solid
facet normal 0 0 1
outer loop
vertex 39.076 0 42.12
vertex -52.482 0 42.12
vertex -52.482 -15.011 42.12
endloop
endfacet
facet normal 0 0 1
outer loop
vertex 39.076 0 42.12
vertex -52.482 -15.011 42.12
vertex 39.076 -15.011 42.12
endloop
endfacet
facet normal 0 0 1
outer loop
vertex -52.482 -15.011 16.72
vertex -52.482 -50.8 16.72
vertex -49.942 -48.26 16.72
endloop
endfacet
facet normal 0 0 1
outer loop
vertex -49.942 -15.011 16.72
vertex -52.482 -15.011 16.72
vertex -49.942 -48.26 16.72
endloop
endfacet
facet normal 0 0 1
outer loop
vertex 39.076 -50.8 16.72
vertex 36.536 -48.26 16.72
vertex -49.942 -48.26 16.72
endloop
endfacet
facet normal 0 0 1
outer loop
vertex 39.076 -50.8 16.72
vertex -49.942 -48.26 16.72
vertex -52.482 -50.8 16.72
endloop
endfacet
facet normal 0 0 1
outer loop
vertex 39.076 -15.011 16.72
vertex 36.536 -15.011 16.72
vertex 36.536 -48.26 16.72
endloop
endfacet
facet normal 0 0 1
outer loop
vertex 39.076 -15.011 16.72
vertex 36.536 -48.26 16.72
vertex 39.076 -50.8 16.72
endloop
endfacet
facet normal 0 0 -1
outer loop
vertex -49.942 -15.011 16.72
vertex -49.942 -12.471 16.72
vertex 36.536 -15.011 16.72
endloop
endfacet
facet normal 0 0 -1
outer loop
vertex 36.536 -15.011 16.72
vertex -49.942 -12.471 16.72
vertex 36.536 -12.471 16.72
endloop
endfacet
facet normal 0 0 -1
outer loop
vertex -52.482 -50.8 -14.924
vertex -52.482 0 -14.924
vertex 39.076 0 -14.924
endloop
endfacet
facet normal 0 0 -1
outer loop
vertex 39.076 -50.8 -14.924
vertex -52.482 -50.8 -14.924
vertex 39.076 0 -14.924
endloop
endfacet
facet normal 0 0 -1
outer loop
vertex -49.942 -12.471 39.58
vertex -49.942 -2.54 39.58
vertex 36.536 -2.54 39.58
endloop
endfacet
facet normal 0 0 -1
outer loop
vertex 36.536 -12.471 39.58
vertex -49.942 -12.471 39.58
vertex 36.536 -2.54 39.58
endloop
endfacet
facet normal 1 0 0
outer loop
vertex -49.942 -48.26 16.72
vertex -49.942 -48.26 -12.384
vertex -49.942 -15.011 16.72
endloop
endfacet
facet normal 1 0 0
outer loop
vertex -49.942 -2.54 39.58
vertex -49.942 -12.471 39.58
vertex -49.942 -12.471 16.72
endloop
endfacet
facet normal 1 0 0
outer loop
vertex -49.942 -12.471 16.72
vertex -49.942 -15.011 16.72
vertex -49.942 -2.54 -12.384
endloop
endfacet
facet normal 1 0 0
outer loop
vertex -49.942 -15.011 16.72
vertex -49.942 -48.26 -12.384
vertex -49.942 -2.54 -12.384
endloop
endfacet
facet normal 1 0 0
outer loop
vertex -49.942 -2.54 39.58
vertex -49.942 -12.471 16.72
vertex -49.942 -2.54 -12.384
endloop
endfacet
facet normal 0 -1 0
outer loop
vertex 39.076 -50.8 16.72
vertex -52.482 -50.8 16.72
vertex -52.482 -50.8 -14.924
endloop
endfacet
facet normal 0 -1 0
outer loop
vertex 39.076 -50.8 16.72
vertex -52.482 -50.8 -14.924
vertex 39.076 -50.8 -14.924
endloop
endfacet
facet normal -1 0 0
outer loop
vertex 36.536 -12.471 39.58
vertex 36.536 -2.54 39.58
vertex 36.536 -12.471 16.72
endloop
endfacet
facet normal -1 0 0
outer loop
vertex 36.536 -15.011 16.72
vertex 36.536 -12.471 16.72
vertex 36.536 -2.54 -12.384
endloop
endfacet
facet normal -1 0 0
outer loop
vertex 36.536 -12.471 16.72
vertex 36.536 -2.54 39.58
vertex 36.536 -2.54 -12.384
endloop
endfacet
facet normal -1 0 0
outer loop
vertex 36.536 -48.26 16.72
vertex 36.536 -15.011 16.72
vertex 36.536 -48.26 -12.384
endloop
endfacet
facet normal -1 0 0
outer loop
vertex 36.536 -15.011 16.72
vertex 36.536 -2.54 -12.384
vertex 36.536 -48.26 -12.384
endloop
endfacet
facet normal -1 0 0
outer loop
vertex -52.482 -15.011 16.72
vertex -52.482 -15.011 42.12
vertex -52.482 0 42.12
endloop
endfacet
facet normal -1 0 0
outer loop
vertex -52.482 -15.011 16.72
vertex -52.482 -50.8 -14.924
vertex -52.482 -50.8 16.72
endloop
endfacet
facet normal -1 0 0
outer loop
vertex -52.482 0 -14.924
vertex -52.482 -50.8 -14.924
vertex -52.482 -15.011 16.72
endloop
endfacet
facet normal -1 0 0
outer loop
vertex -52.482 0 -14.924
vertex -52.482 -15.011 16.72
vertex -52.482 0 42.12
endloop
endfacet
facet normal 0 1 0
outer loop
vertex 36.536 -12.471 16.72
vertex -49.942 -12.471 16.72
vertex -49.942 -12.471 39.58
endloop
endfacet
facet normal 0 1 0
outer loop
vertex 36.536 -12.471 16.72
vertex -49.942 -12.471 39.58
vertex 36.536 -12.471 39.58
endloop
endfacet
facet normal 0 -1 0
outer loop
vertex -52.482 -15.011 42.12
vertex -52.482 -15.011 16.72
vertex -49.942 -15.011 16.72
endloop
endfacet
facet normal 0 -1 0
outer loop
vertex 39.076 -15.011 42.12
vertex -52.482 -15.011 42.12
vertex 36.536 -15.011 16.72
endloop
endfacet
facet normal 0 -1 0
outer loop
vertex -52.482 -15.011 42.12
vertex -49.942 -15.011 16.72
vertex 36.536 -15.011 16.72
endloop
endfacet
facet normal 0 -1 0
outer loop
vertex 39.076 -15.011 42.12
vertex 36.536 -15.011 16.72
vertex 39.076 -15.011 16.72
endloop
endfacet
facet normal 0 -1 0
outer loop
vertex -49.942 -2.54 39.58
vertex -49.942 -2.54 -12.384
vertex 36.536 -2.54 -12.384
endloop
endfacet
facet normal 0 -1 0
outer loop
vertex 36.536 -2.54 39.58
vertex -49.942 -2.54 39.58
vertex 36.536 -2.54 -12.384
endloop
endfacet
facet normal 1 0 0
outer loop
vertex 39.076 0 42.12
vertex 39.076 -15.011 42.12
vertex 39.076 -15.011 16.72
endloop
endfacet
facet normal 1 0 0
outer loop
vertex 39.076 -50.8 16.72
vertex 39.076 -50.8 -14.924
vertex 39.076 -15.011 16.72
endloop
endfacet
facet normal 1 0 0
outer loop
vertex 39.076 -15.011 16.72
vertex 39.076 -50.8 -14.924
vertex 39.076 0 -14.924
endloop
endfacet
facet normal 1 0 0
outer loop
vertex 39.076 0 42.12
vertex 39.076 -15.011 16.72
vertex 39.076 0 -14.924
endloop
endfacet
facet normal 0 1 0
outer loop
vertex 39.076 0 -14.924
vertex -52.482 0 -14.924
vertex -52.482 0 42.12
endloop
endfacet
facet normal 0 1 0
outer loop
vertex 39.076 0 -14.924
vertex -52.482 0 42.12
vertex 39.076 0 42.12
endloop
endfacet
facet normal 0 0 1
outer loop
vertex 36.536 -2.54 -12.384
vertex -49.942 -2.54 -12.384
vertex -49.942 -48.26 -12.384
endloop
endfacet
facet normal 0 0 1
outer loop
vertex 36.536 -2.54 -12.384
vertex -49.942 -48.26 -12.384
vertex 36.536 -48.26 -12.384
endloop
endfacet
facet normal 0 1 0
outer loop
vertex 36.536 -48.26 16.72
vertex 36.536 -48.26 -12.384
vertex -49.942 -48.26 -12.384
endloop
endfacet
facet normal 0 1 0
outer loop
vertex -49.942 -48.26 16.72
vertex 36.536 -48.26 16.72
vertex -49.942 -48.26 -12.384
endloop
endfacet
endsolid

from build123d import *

# Parameters (mm, degrees)
F0_W     = 109.3384288251
F0_H     = 31.6438265145
F1_DEPTH = 50.8
F2_W     = 109.3384288251
F2_H     = 15.0109836832
F3_DEPTH = 25.4
F4_DEPTH = 17.78
F5_T     = -2.54


# Not quite as in the source:
# - a shell that OpenCascade refuses in one call is made with other operations: the cavity is built on its own and cut out


with BuildPart() as f1:
    # F0 (on Front) → F1 (new body)
    with BuildSketch(Plane.XZ):
        with Locations((2.1867696196, 0.8977539837)):
            Rectangle(F0_W, F0_H)
    extrude(amount=F1_DEPTH)

    # F2 (on face) → F3 (join)
    with BuildSketch(Plane.XY.offset(16.719667241)):
        with Locations((2.1867696196, -7.5054918416)):
            Rectangle(F2_W, F2_H)
    extrude(amount=F3_DEPTH)

    # F4 (cut): a face of the model
    f4_faces = [f1.faces().sort_by_distance(p)[0] for p in [
        (56.8559840322, -21.9693633853, 6.3658182119),
    ]]
    extrude(f4_faces, amount=-F4_DEPTH, mode=Mode.SUBTRACT)

    # F5: a shell. OpenCascade refuses it in one call, so the cavity is built on its own and cut out:
    # the body offset inwards by the wall thickness, plus a prism from it out through each open face.
    f5_core = offset(f1.part, amount=F5_T, kind=Kind.INTERSECTION, mode=Mode.PRIVATE)
    f5_exits = [f5_core.faces().sort_by_distance(p)[0] for p in [
        (-6.70323, -30.365492, 14.179667),
    ]]
    add(f5_core, mode=Mode.SUBTRACT)
    extrude(f5_exits, amount=-F5_T, mode=Mode.SUBTRACT)


solid = f1.part
